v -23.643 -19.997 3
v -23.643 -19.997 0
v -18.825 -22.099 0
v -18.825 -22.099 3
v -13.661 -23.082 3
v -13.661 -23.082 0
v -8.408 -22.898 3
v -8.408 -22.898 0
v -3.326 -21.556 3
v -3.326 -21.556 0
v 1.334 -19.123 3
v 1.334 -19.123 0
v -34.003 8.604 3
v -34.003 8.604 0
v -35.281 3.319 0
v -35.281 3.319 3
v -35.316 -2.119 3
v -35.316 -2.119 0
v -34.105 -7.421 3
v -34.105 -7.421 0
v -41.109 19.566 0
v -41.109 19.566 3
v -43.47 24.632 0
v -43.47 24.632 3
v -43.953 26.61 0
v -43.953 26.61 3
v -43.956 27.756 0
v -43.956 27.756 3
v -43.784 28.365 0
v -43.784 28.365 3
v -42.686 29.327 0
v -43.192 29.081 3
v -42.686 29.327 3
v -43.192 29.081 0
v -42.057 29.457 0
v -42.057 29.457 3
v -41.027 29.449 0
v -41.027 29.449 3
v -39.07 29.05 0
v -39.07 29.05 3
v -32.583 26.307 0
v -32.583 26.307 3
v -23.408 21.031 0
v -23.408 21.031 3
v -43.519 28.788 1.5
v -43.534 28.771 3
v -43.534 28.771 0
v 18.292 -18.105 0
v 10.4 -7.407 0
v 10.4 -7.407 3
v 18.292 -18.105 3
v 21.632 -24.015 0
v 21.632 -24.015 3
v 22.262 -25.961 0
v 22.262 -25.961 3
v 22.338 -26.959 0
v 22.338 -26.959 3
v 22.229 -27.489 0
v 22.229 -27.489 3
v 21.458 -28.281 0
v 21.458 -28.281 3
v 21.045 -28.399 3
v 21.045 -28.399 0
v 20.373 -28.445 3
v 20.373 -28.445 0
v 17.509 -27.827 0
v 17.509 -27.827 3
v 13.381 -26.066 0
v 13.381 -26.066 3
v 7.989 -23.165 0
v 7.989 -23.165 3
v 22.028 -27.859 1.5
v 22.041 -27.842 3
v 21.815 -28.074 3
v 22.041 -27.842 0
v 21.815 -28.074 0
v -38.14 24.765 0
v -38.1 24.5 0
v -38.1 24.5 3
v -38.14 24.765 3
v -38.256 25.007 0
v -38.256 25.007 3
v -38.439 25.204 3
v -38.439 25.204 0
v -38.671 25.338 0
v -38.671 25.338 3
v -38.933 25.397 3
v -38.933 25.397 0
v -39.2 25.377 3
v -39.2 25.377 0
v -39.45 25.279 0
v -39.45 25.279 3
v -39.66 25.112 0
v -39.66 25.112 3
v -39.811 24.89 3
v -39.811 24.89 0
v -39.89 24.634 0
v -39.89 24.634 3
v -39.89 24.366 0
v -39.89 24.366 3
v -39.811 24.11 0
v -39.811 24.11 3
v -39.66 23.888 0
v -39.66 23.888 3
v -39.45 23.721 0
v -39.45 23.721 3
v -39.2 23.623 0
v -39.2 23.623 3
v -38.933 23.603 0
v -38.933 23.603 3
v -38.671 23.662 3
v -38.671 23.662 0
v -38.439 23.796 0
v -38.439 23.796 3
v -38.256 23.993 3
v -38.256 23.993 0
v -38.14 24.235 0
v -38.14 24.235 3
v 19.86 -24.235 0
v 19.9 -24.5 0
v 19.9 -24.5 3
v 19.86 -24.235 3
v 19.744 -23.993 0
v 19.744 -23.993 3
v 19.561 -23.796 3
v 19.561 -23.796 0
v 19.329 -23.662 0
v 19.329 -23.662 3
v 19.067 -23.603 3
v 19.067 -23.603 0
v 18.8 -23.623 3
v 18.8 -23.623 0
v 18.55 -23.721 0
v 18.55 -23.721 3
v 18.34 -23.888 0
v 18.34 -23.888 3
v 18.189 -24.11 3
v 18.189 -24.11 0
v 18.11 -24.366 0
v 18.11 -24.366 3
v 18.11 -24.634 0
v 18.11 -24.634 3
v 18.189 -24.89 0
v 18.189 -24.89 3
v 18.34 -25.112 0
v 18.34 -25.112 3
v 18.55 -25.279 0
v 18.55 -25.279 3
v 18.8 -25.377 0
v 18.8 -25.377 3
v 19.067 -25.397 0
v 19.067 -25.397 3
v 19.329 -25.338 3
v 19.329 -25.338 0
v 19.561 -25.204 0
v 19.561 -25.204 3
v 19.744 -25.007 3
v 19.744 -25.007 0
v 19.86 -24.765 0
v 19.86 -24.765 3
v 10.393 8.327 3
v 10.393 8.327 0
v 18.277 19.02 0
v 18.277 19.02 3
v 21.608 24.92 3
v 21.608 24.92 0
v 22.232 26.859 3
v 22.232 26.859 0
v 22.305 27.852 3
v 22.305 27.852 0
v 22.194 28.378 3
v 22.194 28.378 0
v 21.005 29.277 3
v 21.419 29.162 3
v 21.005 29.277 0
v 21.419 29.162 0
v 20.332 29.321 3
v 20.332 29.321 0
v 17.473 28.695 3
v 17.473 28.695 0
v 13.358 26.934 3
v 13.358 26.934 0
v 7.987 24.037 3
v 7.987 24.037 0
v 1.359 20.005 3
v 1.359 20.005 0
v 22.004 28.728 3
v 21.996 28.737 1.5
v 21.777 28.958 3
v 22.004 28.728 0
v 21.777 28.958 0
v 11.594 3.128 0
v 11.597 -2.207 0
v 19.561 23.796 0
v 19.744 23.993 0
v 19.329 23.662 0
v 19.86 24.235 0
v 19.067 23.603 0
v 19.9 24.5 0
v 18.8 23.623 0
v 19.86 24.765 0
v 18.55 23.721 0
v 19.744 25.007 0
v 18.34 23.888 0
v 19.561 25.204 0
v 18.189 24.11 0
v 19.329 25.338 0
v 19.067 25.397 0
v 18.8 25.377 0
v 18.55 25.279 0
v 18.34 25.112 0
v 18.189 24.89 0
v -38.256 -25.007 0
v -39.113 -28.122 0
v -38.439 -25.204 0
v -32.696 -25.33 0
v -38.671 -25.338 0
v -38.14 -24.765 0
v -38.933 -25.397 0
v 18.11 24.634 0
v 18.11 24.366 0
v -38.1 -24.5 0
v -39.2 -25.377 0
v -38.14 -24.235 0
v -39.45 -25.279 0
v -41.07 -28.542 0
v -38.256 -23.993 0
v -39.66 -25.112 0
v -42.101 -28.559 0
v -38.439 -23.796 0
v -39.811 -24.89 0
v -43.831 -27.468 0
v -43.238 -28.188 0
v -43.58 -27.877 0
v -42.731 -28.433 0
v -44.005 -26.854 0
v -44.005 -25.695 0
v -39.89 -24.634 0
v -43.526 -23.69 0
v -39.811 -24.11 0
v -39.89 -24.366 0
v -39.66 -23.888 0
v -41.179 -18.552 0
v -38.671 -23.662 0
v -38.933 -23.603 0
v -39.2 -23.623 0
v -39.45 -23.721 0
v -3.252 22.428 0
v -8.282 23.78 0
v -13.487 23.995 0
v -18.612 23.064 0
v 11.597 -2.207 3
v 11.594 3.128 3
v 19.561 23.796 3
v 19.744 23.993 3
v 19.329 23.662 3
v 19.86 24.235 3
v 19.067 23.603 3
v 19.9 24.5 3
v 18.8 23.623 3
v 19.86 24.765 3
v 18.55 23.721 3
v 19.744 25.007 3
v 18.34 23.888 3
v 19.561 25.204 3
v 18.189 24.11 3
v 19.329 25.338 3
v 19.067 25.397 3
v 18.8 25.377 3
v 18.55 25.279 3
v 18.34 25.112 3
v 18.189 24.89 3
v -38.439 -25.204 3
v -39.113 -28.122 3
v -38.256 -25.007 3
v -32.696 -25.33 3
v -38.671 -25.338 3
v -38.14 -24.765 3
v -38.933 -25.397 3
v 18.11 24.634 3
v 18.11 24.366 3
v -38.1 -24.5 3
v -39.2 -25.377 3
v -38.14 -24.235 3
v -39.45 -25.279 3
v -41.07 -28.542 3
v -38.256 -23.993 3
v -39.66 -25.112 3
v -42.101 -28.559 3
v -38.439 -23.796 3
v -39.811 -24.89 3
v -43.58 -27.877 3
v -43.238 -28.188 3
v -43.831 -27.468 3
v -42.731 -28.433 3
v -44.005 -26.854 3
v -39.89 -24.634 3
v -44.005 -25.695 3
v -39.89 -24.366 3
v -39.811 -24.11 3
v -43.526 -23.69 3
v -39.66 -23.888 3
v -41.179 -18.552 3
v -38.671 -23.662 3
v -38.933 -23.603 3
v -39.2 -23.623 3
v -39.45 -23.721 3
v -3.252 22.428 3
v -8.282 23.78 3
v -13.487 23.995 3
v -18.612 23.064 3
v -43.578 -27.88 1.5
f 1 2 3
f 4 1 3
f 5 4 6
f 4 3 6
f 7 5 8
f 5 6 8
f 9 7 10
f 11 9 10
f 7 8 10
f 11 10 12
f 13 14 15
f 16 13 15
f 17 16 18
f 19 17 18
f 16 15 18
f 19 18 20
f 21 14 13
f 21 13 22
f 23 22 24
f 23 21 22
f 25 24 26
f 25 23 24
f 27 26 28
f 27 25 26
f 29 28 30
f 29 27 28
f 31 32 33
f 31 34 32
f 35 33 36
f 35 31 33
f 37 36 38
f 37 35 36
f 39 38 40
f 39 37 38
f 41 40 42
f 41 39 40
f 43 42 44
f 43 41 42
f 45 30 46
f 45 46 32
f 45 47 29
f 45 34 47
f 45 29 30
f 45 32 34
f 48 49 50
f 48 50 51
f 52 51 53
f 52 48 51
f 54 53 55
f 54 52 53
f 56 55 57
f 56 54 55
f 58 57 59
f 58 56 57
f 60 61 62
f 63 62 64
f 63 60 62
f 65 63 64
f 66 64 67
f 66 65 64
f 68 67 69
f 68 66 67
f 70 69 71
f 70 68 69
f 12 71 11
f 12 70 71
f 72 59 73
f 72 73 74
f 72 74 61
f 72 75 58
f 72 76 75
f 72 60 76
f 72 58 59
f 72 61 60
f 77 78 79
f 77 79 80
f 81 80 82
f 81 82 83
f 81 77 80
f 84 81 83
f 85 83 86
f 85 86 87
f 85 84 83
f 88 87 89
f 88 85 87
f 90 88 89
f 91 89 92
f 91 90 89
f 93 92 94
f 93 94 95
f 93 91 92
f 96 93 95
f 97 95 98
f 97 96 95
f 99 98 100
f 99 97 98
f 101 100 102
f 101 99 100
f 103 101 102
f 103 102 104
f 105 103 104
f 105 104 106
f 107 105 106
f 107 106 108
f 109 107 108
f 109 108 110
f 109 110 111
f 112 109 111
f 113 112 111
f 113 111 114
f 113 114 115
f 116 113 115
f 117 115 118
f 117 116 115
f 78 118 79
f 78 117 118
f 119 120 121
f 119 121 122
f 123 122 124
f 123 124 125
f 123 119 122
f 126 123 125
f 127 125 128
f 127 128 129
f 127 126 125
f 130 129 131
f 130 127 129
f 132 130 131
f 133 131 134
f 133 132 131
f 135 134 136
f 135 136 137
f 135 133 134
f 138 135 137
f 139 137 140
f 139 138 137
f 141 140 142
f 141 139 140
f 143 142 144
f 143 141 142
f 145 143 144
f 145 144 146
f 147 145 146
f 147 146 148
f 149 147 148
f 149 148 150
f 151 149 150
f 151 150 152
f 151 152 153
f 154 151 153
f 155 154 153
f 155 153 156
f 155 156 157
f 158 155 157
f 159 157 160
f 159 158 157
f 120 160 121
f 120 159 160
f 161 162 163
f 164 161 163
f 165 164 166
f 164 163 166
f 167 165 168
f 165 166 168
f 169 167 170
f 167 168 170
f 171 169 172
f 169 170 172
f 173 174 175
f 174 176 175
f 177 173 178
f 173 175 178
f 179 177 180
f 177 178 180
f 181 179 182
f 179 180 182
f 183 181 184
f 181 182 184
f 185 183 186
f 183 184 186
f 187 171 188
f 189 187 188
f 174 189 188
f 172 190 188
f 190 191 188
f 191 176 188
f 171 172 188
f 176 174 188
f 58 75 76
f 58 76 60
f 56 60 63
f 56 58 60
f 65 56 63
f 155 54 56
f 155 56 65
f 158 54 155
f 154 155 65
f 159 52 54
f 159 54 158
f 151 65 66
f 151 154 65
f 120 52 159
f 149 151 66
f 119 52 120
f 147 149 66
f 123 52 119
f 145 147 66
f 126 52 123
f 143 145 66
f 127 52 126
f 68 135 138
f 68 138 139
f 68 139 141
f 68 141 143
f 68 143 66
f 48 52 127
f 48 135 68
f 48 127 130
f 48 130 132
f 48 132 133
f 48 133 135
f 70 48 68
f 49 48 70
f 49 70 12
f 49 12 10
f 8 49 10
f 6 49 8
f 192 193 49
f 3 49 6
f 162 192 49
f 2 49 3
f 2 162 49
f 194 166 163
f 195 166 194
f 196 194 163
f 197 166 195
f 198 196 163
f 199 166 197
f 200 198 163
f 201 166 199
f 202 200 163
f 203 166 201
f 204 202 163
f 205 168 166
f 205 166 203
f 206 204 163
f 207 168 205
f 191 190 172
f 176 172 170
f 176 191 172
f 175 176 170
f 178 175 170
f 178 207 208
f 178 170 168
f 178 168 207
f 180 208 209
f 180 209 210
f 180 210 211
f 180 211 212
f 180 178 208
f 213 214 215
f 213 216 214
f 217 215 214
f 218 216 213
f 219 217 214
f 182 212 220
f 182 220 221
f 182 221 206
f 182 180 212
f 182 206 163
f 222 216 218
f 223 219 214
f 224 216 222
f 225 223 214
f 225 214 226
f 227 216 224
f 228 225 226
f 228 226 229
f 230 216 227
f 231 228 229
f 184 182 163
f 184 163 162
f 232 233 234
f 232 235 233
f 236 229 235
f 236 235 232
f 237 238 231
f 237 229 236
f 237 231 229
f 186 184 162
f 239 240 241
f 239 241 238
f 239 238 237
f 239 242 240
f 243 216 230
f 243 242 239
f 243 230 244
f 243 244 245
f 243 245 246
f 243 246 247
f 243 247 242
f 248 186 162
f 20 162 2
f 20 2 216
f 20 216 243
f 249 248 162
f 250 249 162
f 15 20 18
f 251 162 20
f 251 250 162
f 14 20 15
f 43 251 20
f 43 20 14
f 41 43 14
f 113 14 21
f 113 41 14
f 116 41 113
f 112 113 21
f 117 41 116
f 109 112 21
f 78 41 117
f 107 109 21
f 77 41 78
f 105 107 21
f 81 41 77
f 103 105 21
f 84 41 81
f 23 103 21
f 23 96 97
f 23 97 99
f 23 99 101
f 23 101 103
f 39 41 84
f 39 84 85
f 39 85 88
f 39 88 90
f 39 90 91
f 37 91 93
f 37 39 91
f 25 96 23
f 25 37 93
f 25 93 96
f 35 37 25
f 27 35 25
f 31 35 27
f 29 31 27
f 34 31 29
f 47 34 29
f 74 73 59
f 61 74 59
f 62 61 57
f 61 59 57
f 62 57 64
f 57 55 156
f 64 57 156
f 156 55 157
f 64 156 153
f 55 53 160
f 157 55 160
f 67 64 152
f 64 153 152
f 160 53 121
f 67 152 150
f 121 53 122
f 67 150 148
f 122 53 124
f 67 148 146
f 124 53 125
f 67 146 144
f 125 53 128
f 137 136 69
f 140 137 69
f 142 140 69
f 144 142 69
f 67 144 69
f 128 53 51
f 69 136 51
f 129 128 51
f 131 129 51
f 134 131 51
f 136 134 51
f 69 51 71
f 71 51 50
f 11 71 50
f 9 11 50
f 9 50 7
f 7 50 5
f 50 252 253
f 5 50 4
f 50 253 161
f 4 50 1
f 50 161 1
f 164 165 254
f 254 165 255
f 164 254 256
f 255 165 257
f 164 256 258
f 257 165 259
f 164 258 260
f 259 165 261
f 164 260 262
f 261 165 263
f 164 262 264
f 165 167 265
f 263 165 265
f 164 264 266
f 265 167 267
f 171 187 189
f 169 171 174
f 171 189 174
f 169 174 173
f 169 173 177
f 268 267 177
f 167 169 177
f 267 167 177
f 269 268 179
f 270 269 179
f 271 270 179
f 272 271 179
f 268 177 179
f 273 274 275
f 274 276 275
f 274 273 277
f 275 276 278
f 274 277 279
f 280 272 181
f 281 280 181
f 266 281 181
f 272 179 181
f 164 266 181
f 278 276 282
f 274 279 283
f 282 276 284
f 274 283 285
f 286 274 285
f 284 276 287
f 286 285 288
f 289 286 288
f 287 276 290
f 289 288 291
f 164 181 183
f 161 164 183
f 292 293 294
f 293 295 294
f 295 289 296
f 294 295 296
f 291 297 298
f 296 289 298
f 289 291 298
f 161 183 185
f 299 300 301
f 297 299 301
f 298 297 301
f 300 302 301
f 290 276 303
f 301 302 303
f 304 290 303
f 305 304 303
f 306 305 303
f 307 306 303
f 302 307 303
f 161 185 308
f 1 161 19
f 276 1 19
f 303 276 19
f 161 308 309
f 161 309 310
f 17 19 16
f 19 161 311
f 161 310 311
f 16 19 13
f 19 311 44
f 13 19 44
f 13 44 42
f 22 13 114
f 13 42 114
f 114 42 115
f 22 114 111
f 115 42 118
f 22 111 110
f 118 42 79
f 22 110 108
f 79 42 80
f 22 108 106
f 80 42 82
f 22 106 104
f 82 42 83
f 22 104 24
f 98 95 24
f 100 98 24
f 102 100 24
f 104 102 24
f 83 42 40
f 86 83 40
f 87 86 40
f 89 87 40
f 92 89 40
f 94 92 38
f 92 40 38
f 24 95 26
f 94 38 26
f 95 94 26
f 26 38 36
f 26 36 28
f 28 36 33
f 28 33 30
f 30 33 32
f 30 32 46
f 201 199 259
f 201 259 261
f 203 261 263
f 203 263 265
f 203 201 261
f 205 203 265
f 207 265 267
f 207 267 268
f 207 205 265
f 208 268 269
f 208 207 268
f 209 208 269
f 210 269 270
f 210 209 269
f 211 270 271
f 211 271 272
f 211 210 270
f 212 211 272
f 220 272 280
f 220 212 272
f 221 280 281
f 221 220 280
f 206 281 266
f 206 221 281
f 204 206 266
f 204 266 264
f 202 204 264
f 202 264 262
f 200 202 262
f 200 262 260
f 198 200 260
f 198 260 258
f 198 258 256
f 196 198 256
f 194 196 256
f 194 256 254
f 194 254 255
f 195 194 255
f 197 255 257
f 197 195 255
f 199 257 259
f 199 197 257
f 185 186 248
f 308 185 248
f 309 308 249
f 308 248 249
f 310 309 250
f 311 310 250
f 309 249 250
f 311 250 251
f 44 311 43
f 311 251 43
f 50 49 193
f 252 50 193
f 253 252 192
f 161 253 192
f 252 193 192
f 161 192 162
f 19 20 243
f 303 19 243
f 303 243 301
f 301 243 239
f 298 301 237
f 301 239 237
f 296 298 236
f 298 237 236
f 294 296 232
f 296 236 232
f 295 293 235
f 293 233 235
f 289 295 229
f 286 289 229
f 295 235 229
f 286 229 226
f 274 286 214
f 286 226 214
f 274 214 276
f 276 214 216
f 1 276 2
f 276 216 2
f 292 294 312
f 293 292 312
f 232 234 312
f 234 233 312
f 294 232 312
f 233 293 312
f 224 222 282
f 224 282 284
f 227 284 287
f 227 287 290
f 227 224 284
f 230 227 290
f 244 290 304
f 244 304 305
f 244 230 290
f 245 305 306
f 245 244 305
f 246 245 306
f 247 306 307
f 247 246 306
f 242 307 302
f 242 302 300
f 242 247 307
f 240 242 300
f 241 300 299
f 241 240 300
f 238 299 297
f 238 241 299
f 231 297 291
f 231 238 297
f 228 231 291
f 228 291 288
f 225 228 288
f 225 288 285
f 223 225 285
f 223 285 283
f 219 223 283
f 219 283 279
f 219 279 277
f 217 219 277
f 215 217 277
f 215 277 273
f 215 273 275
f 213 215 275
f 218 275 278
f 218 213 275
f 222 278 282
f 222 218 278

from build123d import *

# Parameters (mm, degrees)
SKETCH2_R           = 0.9
BOSS_EXTRUDE1_DEPTH = 3


with BuildPart() as part:
    # Sketch2 → Boss-Extrude1 (new body)
    with BuildSketch(Plane.XY):
        with BuildLine():
            add(Edge.make_bspline(
                [(-34.002851303, 8.604476718), (-58.333457607, 42.758566595), (-23.407809103, 21.030549249)],
                knots=[0, 0, 0, 1, 1, 1], degree=2))
            ThreePointArc((-34.002851303, 8.604476718), (-35.455837584, 0.600929894), (-34.105332305, -7.42054543))
            add(Edge.make_bspline(
                [(-34.105332305, -7.42054543), (-58.281676493, -42.050918016), (-23.642702616, -19.996916463)],
                knots=[0, 0, 0, 1, 1, 1], degree=2))
            ThreePointArc((-23.642702616, -19.996916463), (-11.029350737, -23.137049671), (1.333618717, -19.122816437))
            add(Edge.make_bspline(
                [(10.40030161, -7.407444616), (38.188248564, -42.452256001), (1.333618717, -19.122816437)],
                knots=[0, 0, 0, 1, 1, 1], degree=2))
            ThreePointArc((10.40030161, -7.407444616), (11.746657416, 0.460490628), (10.393307704, 8.32722588))
            add(Edge.make_bspline(
                [(10.393307704, 8.32722588), (38.116592963, 43.308207972), (1.359443986, 20.005390199)],
                knots=[0.00410137, 0.00410137, 0.00410137, 0.997962678, 0.997962678, 0.997962678], degree=2))
            ThreePointArc((1.359443986, 20.005390199), (-10.878759881, 24.031297997), (-23.407809103, 21.030549249))
        make_face()
        with Locations((-39, -24.5)):
            Circle(SKETCH2_R, mode=Mode.SUBTRACT)
        with Locations((19, -24.5)):
            Circle(SKETCH2_R, mode=Mode.SUBTRACT)
        with Locations((-39, 24.5)):
            Circle(SKETCH2_R, mode=Mode.SUBTRACT)
        with Locations((19, 24.5)):
            Circle(SKETCH2_R, mode=Mode.SUBTRACT)
    extrude(amount=BOSS_EXTRUDE1_DEPTH)


solid = part.part
